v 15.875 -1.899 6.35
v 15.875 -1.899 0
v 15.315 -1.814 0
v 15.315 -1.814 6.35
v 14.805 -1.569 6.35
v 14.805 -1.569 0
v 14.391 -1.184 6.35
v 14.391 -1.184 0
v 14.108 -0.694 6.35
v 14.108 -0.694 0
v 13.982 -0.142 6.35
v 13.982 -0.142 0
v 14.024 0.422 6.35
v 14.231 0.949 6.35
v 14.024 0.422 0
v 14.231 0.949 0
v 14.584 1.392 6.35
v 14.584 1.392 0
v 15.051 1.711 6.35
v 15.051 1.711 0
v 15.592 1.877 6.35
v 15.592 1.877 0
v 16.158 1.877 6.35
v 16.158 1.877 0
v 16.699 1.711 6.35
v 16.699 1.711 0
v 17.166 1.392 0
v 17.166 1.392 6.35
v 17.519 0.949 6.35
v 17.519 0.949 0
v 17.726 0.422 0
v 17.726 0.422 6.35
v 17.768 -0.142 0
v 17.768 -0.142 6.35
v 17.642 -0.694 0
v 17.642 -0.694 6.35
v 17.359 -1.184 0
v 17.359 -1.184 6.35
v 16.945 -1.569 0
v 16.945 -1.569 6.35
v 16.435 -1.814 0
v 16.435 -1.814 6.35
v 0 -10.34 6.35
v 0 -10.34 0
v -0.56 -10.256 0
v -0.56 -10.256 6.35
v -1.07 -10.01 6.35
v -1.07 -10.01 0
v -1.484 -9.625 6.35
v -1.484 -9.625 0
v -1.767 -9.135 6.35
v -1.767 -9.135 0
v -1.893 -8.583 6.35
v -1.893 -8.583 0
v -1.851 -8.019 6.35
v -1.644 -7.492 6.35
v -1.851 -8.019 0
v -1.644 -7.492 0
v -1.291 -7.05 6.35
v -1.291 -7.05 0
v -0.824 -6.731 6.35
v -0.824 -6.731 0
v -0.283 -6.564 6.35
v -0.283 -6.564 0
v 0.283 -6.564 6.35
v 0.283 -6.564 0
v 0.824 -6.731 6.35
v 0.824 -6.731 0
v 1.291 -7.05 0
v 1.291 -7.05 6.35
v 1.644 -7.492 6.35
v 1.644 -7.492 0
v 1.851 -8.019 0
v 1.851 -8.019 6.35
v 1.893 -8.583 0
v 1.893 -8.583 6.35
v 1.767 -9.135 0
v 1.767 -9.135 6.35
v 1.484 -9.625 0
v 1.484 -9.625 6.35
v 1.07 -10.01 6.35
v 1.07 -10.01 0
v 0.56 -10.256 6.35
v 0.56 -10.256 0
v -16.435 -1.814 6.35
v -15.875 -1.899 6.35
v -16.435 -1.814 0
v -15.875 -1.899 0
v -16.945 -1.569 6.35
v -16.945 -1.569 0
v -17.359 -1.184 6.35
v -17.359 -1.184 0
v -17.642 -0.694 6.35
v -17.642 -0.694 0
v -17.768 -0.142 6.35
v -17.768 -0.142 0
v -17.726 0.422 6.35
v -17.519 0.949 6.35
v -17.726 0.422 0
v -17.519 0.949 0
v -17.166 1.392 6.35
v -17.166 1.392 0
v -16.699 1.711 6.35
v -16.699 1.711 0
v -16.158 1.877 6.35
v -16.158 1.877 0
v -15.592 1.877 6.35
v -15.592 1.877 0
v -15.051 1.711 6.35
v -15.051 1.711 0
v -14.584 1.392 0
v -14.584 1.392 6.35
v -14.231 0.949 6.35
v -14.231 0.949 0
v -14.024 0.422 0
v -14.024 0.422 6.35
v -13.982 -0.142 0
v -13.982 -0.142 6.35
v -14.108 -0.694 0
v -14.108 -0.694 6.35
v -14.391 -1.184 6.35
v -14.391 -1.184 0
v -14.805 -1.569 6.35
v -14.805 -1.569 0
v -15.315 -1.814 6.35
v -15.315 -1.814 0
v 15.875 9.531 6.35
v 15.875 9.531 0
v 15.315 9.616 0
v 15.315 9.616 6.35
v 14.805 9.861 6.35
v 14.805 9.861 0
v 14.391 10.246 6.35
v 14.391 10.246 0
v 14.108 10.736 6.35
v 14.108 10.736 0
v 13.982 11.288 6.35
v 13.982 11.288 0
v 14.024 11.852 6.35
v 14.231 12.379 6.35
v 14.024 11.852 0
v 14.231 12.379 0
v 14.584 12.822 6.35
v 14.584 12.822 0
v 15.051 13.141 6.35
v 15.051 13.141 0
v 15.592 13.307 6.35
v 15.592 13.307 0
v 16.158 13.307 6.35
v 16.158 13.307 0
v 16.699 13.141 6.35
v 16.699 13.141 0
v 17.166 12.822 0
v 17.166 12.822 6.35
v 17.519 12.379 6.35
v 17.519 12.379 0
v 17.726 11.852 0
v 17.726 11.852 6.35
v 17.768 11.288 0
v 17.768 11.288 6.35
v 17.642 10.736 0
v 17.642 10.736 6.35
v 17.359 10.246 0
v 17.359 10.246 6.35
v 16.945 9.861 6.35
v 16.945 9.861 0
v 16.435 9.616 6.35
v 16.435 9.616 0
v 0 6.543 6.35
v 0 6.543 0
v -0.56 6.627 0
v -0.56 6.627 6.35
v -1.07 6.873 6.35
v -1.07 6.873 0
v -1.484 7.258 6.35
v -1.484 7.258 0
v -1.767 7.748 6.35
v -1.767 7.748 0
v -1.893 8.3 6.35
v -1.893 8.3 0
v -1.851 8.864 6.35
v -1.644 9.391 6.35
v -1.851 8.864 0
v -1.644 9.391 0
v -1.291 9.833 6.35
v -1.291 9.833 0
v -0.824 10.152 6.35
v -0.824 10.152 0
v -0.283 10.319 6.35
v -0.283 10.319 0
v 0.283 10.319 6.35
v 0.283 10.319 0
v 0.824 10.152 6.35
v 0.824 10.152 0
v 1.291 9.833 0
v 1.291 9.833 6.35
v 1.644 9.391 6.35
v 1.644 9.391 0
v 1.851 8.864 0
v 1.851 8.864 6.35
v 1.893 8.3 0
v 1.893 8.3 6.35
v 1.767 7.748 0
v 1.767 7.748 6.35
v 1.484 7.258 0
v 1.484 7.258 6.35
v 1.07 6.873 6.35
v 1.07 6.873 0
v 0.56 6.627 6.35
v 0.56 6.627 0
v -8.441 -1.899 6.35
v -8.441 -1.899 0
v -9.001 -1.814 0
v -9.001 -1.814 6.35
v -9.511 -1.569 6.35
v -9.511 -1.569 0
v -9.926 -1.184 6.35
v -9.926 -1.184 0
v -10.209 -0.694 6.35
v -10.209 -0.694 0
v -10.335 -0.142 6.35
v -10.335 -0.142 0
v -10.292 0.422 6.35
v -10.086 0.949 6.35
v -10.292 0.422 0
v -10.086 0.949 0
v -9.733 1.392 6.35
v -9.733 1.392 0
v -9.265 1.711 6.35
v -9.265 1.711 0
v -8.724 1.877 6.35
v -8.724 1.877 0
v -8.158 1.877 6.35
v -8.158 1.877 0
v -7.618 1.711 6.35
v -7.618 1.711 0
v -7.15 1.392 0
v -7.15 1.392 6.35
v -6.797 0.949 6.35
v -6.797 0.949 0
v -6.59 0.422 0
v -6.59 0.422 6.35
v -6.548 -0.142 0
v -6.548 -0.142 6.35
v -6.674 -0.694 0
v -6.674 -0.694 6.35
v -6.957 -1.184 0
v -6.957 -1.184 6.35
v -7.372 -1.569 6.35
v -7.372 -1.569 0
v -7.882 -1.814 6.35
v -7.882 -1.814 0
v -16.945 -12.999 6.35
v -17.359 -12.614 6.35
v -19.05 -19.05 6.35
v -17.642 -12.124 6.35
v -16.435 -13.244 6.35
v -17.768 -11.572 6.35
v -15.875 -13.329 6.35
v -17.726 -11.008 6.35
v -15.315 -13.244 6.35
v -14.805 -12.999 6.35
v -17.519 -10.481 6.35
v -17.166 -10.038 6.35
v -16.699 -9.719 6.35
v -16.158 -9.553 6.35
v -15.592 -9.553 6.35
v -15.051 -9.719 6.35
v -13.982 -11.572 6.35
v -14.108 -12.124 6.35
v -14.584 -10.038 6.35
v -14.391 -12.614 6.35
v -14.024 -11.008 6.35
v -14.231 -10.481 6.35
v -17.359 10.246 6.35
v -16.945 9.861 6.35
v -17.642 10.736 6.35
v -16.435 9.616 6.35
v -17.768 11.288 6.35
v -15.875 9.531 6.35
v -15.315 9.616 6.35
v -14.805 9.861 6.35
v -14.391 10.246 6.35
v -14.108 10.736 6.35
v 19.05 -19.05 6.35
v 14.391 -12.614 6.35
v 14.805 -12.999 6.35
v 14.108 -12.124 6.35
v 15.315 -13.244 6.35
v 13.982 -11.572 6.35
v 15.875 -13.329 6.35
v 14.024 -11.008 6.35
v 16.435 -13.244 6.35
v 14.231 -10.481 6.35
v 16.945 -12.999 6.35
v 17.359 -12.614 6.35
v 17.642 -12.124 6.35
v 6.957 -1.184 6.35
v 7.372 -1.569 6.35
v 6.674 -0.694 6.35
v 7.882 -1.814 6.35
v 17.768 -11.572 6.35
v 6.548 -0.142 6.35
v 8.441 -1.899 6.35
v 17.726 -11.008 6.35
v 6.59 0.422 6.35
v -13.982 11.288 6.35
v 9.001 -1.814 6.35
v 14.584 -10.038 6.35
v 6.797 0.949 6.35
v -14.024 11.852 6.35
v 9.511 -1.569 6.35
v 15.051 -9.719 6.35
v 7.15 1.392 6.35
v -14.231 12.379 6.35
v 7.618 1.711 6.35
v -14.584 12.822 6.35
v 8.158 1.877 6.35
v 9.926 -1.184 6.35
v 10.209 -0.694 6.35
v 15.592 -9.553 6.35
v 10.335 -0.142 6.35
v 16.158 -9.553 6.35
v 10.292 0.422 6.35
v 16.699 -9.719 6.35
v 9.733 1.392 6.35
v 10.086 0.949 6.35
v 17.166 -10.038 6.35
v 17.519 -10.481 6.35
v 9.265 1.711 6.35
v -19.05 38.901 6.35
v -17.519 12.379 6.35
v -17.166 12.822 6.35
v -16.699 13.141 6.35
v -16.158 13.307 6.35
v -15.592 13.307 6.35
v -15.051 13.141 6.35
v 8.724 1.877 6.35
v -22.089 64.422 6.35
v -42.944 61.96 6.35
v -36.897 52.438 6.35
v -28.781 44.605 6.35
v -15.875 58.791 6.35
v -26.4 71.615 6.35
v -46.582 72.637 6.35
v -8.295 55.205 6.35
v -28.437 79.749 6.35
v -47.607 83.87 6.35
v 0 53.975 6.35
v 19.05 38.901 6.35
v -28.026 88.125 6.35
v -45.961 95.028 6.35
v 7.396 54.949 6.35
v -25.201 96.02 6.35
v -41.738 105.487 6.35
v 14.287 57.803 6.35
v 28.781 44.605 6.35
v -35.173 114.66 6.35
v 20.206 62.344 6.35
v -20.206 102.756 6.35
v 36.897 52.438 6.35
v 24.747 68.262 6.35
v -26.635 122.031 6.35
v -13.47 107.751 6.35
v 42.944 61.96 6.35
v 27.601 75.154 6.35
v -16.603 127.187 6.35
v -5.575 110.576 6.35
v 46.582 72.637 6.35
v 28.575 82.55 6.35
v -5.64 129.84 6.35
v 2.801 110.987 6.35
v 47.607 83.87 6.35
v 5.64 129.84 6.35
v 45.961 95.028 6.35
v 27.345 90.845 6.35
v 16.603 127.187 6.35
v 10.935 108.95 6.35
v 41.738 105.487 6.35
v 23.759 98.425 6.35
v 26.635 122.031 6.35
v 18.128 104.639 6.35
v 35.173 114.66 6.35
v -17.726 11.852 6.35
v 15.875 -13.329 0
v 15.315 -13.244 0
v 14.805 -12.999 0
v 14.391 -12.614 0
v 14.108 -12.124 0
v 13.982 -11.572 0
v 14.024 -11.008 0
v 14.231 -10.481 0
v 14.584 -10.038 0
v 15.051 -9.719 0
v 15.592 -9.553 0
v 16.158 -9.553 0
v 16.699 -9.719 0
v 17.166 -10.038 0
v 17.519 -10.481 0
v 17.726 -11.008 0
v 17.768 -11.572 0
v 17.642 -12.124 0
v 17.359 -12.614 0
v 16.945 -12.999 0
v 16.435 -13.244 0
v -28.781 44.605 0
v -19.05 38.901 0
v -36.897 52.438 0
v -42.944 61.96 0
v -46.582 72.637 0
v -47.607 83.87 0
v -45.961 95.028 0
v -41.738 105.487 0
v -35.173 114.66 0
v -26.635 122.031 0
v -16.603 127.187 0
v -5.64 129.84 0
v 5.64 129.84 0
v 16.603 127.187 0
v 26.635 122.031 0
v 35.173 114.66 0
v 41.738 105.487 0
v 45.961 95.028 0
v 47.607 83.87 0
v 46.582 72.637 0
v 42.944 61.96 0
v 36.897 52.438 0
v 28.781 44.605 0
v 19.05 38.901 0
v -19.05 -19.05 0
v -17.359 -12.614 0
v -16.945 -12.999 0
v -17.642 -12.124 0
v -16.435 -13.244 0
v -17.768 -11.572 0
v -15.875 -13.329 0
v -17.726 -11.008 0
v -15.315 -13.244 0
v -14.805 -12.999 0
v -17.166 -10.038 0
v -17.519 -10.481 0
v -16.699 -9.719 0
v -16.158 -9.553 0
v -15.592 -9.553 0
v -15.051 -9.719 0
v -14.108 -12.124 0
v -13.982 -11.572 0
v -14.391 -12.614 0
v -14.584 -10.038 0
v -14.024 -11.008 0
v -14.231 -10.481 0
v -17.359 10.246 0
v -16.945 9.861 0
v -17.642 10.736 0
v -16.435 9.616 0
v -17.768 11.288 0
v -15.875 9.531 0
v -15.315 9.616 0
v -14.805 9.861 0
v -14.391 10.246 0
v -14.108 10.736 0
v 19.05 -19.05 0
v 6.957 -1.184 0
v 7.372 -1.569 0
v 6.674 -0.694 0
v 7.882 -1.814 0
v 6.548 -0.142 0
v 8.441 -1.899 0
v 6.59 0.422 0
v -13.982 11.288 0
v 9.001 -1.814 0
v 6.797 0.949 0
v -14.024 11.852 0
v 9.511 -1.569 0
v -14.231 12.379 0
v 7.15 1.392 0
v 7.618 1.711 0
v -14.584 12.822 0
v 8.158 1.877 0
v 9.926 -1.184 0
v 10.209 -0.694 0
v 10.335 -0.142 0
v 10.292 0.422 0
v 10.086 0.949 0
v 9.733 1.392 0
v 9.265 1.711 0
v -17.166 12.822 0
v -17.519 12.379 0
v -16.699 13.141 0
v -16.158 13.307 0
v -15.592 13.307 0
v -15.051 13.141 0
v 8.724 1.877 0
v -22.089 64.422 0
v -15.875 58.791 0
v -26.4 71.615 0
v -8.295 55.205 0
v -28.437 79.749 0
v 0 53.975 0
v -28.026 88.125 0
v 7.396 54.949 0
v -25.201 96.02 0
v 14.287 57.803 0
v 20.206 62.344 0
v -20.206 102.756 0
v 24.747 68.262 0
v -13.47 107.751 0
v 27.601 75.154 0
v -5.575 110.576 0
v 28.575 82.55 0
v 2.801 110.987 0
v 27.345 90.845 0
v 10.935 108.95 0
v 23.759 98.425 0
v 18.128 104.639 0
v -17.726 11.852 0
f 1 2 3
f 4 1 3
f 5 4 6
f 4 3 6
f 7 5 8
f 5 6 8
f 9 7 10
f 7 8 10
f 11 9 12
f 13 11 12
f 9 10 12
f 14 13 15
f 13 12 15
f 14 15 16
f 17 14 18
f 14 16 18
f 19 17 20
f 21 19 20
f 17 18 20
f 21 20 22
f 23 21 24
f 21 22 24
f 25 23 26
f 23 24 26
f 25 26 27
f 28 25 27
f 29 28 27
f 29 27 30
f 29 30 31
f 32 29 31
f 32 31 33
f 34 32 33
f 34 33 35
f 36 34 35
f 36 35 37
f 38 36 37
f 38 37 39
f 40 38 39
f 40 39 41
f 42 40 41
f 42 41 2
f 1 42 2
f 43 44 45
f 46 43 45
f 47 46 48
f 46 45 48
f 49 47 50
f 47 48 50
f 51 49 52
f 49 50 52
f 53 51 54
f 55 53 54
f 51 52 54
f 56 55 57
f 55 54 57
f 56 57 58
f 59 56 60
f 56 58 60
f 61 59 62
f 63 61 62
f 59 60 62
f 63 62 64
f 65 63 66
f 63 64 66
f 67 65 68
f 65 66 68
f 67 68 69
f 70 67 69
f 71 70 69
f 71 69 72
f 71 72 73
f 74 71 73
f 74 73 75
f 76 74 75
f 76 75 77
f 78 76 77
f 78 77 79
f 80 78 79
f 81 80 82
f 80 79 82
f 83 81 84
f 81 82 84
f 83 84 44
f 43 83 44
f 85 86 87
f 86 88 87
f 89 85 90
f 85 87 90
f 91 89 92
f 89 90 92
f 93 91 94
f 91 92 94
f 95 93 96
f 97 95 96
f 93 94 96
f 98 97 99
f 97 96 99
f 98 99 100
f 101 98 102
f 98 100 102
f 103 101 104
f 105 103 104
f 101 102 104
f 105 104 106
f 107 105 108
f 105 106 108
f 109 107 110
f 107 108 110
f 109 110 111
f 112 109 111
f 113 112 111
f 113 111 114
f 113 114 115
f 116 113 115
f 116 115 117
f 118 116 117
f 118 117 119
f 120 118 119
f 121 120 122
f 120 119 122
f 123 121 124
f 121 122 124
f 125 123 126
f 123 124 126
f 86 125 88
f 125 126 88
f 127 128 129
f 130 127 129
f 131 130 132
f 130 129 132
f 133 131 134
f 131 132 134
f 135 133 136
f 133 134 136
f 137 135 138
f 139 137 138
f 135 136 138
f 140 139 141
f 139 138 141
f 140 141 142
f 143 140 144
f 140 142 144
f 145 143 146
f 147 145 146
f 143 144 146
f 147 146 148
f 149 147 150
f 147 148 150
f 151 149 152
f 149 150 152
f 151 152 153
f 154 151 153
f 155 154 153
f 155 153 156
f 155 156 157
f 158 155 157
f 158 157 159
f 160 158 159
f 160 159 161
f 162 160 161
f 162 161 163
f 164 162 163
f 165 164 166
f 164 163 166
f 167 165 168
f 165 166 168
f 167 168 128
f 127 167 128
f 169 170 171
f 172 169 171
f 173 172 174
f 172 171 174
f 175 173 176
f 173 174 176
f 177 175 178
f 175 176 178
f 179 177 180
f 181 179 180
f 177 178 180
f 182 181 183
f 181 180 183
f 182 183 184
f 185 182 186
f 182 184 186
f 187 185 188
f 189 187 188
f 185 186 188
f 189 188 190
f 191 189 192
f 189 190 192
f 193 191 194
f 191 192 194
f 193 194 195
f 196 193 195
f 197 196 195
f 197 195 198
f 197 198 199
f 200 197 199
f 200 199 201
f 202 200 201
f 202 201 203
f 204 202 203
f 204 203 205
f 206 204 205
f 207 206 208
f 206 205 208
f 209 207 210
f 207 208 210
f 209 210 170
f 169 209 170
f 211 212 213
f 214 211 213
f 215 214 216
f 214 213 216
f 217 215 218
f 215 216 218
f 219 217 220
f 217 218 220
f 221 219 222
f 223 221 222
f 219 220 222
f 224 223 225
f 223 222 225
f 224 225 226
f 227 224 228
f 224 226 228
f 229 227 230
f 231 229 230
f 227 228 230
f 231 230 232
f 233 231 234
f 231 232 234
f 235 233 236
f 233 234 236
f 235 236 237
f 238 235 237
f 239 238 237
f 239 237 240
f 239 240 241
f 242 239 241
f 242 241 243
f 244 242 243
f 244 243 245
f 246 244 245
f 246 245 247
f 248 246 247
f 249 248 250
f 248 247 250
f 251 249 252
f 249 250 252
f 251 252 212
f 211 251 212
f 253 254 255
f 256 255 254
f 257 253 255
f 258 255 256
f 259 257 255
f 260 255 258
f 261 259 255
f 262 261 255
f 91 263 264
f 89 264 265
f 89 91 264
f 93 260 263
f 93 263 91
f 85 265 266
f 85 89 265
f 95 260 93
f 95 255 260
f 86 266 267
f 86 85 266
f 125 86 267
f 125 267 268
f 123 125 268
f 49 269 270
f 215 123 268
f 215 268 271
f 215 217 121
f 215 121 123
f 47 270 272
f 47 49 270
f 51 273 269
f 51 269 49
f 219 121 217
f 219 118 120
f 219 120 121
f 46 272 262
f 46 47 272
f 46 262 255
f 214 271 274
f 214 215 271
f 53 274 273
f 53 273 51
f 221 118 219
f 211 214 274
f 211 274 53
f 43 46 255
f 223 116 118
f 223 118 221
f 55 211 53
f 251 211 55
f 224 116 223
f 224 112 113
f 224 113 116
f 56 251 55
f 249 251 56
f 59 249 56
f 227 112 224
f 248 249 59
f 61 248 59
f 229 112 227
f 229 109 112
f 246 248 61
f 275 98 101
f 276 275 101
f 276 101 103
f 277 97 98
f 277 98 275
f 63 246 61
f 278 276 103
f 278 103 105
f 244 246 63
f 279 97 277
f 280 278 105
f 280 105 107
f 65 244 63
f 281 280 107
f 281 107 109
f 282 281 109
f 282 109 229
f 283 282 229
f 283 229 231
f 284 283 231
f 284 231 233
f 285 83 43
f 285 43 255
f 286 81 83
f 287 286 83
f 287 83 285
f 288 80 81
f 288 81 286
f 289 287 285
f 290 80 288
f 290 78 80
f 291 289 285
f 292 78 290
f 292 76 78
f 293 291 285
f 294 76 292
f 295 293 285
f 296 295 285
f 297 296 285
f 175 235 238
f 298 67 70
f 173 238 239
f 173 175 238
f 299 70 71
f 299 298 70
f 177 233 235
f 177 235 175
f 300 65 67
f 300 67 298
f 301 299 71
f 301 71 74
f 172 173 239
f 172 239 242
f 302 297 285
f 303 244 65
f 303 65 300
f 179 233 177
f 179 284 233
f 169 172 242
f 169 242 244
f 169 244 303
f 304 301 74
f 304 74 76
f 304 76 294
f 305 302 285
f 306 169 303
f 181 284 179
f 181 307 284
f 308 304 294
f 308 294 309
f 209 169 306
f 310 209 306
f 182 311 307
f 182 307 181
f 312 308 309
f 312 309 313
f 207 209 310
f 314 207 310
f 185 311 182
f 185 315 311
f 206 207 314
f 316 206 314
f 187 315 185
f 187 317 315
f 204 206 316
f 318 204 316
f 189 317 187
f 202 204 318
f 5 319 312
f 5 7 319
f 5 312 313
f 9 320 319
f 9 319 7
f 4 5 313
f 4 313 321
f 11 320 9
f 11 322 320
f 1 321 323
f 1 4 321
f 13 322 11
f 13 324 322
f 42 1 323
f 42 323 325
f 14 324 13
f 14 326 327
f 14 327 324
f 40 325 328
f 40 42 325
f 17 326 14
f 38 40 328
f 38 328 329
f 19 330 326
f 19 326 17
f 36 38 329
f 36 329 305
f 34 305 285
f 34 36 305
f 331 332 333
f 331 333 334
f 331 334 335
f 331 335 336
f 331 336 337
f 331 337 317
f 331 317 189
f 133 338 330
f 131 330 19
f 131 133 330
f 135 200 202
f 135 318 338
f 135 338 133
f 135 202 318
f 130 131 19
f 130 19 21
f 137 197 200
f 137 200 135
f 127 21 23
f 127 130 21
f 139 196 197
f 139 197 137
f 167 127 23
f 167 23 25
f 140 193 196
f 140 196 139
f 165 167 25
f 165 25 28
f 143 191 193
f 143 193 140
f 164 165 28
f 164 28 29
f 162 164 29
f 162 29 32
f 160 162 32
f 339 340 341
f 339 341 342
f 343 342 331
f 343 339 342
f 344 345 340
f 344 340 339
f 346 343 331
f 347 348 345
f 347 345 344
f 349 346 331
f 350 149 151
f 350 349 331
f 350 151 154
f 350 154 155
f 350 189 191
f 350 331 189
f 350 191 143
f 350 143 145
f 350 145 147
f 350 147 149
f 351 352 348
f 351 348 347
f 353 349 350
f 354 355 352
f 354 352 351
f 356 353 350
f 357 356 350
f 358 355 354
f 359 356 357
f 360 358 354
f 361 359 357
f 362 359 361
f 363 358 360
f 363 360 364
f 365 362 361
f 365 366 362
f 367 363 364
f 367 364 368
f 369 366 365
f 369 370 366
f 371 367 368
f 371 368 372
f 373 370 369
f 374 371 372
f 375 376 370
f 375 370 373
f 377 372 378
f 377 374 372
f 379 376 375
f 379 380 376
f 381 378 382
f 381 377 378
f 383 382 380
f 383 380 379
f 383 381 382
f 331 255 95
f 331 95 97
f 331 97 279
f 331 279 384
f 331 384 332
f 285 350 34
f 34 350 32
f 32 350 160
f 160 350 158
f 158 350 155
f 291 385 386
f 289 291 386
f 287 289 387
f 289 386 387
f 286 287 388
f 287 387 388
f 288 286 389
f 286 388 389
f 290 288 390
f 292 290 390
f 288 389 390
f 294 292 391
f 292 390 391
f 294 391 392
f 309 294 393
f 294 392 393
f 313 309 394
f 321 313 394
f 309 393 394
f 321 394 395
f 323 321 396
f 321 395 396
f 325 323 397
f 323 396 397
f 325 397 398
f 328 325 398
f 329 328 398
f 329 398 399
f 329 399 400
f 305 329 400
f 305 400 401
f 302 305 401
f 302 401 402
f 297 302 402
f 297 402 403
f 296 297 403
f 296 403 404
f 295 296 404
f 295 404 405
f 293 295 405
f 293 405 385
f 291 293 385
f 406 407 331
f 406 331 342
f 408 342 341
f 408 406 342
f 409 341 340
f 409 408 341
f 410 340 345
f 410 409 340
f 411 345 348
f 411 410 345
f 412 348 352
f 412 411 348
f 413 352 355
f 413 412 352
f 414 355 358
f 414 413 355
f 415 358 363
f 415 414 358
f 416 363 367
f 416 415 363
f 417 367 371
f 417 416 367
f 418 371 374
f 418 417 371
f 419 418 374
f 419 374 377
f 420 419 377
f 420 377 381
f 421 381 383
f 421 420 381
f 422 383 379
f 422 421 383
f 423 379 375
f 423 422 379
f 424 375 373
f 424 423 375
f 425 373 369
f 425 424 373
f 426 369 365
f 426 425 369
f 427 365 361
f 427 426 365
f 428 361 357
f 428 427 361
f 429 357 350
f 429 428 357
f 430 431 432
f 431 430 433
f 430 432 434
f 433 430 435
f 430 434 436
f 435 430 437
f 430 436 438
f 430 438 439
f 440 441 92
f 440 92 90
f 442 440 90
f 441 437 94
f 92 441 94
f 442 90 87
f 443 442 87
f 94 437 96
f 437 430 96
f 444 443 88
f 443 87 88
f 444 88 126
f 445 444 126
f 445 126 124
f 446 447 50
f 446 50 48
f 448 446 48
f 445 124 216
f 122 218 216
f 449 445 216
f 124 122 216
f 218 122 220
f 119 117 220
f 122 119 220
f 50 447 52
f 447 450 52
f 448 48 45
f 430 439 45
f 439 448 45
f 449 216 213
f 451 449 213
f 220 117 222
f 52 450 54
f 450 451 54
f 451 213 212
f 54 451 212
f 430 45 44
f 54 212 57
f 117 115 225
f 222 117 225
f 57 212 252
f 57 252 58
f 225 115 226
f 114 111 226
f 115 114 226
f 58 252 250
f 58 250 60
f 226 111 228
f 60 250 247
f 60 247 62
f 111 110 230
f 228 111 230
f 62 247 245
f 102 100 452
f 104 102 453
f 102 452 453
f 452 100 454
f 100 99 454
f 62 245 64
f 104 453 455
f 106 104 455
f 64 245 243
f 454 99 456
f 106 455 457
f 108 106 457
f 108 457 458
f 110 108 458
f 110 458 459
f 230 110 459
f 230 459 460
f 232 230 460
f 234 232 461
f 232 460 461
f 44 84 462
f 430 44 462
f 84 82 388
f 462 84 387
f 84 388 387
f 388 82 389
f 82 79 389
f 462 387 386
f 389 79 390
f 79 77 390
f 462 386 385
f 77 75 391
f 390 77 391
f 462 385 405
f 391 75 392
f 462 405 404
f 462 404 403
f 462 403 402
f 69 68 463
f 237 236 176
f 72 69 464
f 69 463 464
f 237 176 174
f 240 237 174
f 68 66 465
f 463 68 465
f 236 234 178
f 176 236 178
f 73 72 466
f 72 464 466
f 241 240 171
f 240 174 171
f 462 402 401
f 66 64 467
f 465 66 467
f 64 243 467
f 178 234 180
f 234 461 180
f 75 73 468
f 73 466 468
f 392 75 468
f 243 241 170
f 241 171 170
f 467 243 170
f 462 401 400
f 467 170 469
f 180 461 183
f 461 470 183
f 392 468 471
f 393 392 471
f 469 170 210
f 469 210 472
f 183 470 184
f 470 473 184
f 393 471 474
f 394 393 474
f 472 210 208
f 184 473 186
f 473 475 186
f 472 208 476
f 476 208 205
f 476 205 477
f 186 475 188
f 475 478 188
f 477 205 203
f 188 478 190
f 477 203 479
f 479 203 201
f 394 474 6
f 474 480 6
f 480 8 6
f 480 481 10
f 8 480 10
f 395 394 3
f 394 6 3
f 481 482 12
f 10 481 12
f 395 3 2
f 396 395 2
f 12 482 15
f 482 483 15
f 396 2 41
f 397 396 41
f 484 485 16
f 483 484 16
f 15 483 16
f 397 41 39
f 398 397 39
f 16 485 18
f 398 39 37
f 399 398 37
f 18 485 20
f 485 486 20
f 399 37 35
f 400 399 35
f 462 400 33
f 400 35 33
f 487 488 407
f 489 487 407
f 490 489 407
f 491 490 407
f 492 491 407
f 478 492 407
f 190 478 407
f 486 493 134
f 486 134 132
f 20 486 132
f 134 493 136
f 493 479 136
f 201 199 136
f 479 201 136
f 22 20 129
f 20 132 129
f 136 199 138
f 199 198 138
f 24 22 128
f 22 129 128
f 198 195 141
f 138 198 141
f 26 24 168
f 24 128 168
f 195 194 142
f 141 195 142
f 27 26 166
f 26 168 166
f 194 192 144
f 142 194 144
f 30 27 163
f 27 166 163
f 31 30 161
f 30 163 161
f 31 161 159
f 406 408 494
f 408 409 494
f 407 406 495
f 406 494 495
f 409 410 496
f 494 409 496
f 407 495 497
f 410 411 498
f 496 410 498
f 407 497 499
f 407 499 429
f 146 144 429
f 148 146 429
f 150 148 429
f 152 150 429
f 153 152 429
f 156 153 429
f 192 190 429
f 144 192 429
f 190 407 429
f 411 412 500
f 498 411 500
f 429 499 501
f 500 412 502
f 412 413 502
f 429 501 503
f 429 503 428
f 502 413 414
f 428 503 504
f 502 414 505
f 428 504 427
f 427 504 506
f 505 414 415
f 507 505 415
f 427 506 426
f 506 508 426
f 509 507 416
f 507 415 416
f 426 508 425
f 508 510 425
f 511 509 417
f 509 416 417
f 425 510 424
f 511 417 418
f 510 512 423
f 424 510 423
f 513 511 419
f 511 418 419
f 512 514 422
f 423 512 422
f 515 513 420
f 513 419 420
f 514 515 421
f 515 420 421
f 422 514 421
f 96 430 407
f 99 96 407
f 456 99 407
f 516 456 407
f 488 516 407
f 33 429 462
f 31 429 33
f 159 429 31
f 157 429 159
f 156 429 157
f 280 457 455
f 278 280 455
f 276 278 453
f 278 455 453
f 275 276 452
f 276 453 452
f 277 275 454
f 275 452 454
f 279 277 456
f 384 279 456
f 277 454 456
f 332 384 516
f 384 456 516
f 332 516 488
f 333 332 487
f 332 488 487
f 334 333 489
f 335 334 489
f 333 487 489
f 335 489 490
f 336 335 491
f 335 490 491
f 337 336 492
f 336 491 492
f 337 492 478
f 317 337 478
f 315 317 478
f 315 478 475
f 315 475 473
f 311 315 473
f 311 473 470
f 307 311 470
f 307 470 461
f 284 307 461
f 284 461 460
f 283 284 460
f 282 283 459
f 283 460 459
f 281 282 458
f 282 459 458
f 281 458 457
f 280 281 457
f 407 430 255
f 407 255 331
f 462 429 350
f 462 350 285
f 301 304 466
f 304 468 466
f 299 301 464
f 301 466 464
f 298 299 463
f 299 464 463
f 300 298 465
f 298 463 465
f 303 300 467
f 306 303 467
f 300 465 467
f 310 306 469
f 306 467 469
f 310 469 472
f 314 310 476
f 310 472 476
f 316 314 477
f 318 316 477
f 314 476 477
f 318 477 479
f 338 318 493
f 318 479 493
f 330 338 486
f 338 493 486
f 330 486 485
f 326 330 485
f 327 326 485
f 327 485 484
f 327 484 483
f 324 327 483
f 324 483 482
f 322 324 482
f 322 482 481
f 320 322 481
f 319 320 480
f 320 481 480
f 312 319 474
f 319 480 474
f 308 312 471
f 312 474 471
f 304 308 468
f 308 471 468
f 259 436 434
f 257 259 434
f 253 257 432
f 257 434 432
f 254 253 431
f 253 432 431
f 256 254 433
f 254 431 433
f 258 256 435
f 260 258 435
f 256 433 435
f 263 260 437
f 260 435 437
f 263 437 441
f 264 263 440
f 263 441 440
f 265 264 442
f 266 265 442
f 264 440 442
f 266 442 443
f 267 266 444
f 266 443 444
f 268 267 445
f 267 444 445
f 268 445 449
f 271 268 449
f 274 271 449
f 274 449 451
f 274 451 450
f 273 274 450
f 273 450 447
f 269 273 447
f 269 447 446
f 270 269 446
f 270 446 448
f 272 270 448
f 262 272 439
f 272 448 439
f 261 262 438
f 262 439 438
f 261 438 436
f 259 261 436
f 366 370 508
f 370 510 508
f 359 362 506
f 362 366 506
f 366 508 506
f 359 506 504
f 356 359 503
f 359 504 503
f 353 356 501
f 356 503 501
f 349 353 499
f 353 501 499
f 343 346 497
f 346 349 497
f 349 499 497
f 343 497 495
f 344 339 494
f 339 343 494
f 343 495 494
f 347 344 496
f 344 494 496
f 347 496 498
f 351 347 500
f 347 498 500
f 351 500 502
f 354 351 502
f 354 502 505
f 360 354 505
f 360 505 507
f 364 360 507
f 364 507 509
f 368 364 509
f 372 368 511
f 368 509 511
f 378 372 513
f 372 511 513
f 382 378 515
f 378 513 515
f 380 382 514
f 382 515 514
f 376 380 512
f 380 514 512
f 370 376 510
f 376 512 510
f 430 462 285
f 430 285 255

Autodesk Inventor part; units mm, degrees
ref_plane "YZ Plane" through (0, 0, 0) normal (1, 0, 0) x (0, 1, 0)
ref_plane "XZ Plane" through (0, 0, 0) normal (0, 1, 0) x (-1, 0, 0)
ref_plane "XY Plane" through (0, 0, 0) normal (0, 0, 1) x (1, 0, 0)
sketch "Sketch1" plane through (0, 0, 0) normal (0, 0, 1) x (1, 0, 0)
  line L0 (19.05, -19.05) -> (-19.05, -19.05)
  line L1 (-19.05, -19.05) -> (-19.05, 19.05)
  line L2 (-19.05, 19.05) -> (19.05, 19.05)
  line L3 (19.05, 19.05) -> (19.05, -19.05)
  line L4 (19.05, -19.05) -> (-19.05, 19.05) construction
  line L5 (-19.05, -19.05) -> (19.05, 19.05) construction
  line L6 (-19.05, 19.05) -> (19.05, 19.05)
  line L7 (19.05, 19.05) -> (19.05, 44.45)
  line L8 (19.05, 44.45) -> (-19.05, 44.45)
  line L9 (-19.05, 44.45) -> (-19.05, 19.05)
  line L10 (0, 19.05) -> (0, 82.55)
  circle A0 centre (0, 82.55) radius 47.625
  circle A1 centre (0, 82.55) radius 28.575
  point P0 (0, 0)
  dimension "d0" = 38.1
  dimension "d1" = 38.1
  dimension "d2" = 25.4
  dimension "d3" = 63.5
  dimension "d4" = 95.25
  dimension "d5" = 57.15
extrude "Extrusion1" add sketch "Sketch1" along normal blind 6.35
sketch "Sketch2" plane through (0, 0, 6.35) normal (0, 0, 1) x (1, 0, 0)
  circle A0 centre (0, 82.55) radius 28.575 construction
  arc A1 (19.05, 38.901) -> (-19.05, 38.901) centre (0, 82.55) ccw construction
  line L0 (-19.05, 38.901) -> (-19.05, -19.05) construction
  line L1 (-19.05, -19.05) -> (19.05, -19.05) construction
  line L2 (19.05, -19.05) -> (19.05, 38.901) construction
  line L3 (-19.05, -19.05) -> (19.05, -19.05) construction
  line L4 (19.05, -19.05) -> (19.05, 19.05) construction
  line L5 (19.05, 19.05) -> (-19.05, 19.05) construction
  line L6 (-19.05, 19.05) -> (-19.05, -19.05) construction
  line L7 (15.875, -11.43) -> (-15.875, -11.43) construction
  line L8 (-15.875, -11.43) -> (-15.875, 11.43) construction
  line L9 (-15.875, 11.43) -> (15.875, 11.43) construction
  line L10 (15.875, 11.43) -> (15.875, -11.43) construction
  line L11 (15.875, -11.43) -> (-15.875, 11.43) construction
  line L12 (-15.875, -11.43) -> (15.875, 11.43) construction
  line L13 (11.43, -15.875) -> (-11.43, -15.875) construction
  line L14 (-11.43, -15.875) -> (-11.43, 15.875) construction
  line L15 (-11.43, 15.875) -> (11.43, 15.875) construction
  line L16 (11.43, 15.875) -> (11.43, -15.875) construction
  line L17 (11.43, -15.875) -> (-11.43, 15.875) construction
  line L18 (-11.43, -15.875) -> (11.43, 15.875) construction
  line L19 (0, -8.4414) -> (8.4414, 0) construction
  line L20 (8.4414, 0) -> (0, 8.4414) construction
  line L21 (0, 8.4414) -> (-8.4414, 0) construction
  line L22 (-8.4414, 0) -> (0, -8.4414) construction
  line L23 (-5.969, -5.969) -> (5.969, 5.969) construction
  line L24 (5.969, -5.969) -> (-5.969, 5.969) construction
  line L25 (-8.4414, -8.4414) -> (8.4414, -8.4414) construction
  line L26 (8.4414, -8.4414) -> (8.4414, 8.4414) construction
  line L27 (8.4414, 8.4414) -> (-8.4414, 8.4414) construction
  line L28 (-8.4414, 8.4414) -> (-8.4414, -8.4414) construction
  line L29 (-8.4414, -8.4414) -> (8.4414, 8.4414) construction
  line L30 (8.4414, -8.4414) -> (-8.4414, 8.4414) construction
  point P0 (0, 0)
  point P1 (0, 8.4414)
  point P2 (8.4414, 0)
  point P3 (-15.875, 0)
  point P4 (15.875, 0)
  dimension "d8" = 38.1
  dimension "d9" = 38.1
  dimension "d10" = 31.75
  dimension "d11" = 22.86
  dimension "d12" = 22.86
  dimension "d13" = 31.75
  dimension "d14" = 11.938
  dimension "d15" = 11.938
  dimension "d16" = 16.8829
  dimension "d17" = 16.8829
  dimension "d18" = 4.445
  dimension "d19" = 7.4336
  dimension "d20" = 5.969
  dimension "d21" = 5.969
  dimension "d22" = 4.445
  dimension "d23" = 7.4336
  dimension "d24" = 9.906
  dimension "d25" = 9.906
  dimension "d26" = 21.844
  dimension "d27" = 21.844
  dimension "d28" = 3.175
  dimension "d29" = 27.4914
hole "Hole1" at (-15.875, 11.43, 6.35) at (-15.875, 0, 6.35) at (-15.875, -11.43, 6.35) at (15.875, -11.43, 6.35) at (15.875, 0, 6.35) at (15.875, 11.43, 6.35) at (0, 8.4414, 6.35) at (0, -8.4414, 6.35) at (8.4414, 0, 6.35) at (-8.4414, 0, 6.35) direction (0, 0, -1) diameter 3.7973 end through all
properties part number "goniometer_stage_top_v01" material "Stainless Steel AISI 304"
